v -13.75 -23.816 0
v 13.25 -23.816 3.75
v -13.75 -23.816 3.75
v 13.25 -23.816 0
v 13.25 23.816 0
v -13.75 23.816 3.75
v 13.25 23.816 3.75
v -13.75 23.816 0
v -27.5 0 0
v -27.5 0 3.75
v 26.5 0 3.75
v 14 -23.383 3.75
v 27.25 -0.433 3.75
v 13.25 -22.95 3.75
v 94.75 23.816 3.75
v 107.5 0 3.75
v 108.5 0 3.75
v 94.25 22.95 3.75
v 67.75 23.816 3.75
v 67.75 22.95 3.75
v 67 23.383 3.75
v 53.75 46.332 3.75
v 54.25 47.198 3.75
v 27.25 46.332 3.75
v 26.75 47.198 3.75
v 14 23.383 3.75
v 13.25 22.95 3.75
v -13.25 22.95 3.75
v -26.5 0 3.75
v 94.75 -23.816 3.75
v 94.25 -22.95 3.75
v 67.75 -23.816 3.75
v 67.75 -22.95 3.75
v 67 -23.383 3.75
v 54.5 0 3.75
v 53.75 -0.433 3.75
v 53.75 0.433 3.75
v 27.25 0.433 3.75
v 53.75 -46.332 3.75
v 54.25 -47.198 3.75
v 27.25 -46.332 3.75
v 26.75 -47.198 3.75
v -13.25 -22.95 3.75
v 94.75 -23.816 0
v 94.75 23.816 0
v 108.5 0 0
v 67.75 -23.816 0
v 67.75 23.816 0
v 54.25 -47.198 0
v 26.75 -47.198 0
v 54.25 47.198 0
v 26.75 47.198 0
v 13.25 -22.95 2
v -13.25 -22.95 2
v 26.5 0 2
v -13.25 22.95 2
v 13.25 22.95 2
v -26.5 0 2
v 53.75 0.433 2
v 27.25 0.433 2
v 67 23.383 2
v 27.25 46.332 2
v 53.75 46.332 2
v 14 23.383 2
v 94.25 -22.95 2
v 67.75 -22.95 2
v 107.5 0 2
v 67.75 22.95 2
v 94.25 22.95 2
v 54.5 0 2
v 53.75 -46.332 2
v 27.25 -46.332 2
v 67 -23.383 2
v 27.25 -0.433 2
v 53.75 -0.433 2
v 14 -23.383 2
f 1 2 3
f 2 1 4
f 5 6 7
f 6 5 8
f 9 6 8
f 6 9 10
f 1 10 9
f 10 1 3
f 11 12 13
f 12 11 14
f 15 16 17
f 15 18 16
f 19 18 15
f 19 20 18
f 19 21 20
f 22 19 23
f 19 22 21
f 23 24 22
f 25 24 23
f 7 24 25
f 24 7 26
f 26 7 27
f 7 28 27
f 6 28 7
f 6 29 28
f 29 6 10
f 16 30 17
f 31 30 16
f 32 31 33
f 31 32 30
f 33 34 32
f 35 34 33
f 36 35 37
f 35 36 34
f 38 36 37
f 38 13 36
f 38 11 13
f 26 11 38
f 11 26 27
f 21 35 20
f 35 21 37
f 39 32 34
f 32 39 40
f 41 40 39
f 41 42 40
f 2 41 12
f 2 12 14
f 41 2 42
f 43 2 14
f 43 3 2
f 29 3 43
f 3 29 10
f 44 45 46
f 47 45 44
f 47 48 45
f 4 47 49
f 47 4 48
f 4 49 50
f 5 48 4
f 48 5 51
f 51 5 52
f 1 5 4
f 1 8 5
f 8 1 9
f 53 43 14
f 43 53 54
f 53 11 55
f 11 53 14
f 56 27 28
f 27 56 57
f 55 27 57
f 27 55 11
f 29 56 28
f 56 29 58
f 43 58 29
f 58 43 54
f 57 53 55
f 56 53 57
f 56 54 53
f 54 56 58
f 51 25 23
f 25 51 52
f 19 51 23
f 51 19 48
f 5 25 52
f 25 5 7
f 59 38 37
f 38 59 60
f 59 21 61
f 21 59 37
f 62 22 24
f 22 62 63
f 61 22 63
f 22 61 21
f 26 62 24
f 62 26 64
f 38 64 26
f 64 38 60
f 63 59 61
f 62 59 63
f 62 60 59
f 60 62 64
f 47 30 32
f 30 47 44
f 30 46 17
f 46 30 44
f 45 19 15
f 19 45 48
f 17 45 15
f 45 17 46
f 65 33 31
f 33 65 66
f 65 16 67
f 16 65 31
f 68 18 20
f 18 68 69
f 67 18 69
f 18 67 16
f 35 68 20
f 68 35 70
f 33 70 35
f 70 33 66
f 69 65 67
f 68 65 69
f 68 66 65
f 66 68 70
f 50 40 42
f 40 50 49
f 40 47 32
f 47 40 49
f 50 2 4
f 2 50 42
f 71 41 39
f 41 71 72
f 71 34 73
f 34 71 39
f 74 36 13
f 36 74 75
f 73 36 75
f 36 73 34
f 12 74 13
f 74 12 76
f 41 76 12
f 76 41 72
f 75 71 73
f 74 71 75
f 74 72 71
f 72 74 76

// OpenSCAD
union() {
	translate(v = [0.0, 0.0, 0]) {
		difference() {
			cylinder($fn = 6, d = 55.0, h = 3.75);
			translate(v = [0, 0, 2.0]) {
				cylinder($fn = 6, d = 53.0, h = 2.75);
			}
		}
	}
	translate(v = [40.5, 23.38268590217984, 0]) {
		difference() {
			cylinder($fn = 6, d = 55.0, h = 3.75);
			translate(v = [0, 0, 2.0]) {
				cylinder($fn = 6, d = 53.0, h = 2.75);
			}
		}
	}
	translate(v = [81.0, 0.0, 0]) {
		difference() {
			cylinder($fn = 6, d = 55.0, h = 3.75);
			translate(v = [0, 0, 2.0]) {
				cylinder($fn = 6, d = 53.0, h = 2.75);
			}
		}
	}
	translate(v = [40.5, -23.38268590217984, 0]) {
		difference() {
			cylinder($fn = 6, d = 55.0, h = 3.75);
			translate(v = [0, 0, 2.0]) {
				cylinder($fn = 6, d = 53.0, h = 2.75);
			}
		}
	}
}
